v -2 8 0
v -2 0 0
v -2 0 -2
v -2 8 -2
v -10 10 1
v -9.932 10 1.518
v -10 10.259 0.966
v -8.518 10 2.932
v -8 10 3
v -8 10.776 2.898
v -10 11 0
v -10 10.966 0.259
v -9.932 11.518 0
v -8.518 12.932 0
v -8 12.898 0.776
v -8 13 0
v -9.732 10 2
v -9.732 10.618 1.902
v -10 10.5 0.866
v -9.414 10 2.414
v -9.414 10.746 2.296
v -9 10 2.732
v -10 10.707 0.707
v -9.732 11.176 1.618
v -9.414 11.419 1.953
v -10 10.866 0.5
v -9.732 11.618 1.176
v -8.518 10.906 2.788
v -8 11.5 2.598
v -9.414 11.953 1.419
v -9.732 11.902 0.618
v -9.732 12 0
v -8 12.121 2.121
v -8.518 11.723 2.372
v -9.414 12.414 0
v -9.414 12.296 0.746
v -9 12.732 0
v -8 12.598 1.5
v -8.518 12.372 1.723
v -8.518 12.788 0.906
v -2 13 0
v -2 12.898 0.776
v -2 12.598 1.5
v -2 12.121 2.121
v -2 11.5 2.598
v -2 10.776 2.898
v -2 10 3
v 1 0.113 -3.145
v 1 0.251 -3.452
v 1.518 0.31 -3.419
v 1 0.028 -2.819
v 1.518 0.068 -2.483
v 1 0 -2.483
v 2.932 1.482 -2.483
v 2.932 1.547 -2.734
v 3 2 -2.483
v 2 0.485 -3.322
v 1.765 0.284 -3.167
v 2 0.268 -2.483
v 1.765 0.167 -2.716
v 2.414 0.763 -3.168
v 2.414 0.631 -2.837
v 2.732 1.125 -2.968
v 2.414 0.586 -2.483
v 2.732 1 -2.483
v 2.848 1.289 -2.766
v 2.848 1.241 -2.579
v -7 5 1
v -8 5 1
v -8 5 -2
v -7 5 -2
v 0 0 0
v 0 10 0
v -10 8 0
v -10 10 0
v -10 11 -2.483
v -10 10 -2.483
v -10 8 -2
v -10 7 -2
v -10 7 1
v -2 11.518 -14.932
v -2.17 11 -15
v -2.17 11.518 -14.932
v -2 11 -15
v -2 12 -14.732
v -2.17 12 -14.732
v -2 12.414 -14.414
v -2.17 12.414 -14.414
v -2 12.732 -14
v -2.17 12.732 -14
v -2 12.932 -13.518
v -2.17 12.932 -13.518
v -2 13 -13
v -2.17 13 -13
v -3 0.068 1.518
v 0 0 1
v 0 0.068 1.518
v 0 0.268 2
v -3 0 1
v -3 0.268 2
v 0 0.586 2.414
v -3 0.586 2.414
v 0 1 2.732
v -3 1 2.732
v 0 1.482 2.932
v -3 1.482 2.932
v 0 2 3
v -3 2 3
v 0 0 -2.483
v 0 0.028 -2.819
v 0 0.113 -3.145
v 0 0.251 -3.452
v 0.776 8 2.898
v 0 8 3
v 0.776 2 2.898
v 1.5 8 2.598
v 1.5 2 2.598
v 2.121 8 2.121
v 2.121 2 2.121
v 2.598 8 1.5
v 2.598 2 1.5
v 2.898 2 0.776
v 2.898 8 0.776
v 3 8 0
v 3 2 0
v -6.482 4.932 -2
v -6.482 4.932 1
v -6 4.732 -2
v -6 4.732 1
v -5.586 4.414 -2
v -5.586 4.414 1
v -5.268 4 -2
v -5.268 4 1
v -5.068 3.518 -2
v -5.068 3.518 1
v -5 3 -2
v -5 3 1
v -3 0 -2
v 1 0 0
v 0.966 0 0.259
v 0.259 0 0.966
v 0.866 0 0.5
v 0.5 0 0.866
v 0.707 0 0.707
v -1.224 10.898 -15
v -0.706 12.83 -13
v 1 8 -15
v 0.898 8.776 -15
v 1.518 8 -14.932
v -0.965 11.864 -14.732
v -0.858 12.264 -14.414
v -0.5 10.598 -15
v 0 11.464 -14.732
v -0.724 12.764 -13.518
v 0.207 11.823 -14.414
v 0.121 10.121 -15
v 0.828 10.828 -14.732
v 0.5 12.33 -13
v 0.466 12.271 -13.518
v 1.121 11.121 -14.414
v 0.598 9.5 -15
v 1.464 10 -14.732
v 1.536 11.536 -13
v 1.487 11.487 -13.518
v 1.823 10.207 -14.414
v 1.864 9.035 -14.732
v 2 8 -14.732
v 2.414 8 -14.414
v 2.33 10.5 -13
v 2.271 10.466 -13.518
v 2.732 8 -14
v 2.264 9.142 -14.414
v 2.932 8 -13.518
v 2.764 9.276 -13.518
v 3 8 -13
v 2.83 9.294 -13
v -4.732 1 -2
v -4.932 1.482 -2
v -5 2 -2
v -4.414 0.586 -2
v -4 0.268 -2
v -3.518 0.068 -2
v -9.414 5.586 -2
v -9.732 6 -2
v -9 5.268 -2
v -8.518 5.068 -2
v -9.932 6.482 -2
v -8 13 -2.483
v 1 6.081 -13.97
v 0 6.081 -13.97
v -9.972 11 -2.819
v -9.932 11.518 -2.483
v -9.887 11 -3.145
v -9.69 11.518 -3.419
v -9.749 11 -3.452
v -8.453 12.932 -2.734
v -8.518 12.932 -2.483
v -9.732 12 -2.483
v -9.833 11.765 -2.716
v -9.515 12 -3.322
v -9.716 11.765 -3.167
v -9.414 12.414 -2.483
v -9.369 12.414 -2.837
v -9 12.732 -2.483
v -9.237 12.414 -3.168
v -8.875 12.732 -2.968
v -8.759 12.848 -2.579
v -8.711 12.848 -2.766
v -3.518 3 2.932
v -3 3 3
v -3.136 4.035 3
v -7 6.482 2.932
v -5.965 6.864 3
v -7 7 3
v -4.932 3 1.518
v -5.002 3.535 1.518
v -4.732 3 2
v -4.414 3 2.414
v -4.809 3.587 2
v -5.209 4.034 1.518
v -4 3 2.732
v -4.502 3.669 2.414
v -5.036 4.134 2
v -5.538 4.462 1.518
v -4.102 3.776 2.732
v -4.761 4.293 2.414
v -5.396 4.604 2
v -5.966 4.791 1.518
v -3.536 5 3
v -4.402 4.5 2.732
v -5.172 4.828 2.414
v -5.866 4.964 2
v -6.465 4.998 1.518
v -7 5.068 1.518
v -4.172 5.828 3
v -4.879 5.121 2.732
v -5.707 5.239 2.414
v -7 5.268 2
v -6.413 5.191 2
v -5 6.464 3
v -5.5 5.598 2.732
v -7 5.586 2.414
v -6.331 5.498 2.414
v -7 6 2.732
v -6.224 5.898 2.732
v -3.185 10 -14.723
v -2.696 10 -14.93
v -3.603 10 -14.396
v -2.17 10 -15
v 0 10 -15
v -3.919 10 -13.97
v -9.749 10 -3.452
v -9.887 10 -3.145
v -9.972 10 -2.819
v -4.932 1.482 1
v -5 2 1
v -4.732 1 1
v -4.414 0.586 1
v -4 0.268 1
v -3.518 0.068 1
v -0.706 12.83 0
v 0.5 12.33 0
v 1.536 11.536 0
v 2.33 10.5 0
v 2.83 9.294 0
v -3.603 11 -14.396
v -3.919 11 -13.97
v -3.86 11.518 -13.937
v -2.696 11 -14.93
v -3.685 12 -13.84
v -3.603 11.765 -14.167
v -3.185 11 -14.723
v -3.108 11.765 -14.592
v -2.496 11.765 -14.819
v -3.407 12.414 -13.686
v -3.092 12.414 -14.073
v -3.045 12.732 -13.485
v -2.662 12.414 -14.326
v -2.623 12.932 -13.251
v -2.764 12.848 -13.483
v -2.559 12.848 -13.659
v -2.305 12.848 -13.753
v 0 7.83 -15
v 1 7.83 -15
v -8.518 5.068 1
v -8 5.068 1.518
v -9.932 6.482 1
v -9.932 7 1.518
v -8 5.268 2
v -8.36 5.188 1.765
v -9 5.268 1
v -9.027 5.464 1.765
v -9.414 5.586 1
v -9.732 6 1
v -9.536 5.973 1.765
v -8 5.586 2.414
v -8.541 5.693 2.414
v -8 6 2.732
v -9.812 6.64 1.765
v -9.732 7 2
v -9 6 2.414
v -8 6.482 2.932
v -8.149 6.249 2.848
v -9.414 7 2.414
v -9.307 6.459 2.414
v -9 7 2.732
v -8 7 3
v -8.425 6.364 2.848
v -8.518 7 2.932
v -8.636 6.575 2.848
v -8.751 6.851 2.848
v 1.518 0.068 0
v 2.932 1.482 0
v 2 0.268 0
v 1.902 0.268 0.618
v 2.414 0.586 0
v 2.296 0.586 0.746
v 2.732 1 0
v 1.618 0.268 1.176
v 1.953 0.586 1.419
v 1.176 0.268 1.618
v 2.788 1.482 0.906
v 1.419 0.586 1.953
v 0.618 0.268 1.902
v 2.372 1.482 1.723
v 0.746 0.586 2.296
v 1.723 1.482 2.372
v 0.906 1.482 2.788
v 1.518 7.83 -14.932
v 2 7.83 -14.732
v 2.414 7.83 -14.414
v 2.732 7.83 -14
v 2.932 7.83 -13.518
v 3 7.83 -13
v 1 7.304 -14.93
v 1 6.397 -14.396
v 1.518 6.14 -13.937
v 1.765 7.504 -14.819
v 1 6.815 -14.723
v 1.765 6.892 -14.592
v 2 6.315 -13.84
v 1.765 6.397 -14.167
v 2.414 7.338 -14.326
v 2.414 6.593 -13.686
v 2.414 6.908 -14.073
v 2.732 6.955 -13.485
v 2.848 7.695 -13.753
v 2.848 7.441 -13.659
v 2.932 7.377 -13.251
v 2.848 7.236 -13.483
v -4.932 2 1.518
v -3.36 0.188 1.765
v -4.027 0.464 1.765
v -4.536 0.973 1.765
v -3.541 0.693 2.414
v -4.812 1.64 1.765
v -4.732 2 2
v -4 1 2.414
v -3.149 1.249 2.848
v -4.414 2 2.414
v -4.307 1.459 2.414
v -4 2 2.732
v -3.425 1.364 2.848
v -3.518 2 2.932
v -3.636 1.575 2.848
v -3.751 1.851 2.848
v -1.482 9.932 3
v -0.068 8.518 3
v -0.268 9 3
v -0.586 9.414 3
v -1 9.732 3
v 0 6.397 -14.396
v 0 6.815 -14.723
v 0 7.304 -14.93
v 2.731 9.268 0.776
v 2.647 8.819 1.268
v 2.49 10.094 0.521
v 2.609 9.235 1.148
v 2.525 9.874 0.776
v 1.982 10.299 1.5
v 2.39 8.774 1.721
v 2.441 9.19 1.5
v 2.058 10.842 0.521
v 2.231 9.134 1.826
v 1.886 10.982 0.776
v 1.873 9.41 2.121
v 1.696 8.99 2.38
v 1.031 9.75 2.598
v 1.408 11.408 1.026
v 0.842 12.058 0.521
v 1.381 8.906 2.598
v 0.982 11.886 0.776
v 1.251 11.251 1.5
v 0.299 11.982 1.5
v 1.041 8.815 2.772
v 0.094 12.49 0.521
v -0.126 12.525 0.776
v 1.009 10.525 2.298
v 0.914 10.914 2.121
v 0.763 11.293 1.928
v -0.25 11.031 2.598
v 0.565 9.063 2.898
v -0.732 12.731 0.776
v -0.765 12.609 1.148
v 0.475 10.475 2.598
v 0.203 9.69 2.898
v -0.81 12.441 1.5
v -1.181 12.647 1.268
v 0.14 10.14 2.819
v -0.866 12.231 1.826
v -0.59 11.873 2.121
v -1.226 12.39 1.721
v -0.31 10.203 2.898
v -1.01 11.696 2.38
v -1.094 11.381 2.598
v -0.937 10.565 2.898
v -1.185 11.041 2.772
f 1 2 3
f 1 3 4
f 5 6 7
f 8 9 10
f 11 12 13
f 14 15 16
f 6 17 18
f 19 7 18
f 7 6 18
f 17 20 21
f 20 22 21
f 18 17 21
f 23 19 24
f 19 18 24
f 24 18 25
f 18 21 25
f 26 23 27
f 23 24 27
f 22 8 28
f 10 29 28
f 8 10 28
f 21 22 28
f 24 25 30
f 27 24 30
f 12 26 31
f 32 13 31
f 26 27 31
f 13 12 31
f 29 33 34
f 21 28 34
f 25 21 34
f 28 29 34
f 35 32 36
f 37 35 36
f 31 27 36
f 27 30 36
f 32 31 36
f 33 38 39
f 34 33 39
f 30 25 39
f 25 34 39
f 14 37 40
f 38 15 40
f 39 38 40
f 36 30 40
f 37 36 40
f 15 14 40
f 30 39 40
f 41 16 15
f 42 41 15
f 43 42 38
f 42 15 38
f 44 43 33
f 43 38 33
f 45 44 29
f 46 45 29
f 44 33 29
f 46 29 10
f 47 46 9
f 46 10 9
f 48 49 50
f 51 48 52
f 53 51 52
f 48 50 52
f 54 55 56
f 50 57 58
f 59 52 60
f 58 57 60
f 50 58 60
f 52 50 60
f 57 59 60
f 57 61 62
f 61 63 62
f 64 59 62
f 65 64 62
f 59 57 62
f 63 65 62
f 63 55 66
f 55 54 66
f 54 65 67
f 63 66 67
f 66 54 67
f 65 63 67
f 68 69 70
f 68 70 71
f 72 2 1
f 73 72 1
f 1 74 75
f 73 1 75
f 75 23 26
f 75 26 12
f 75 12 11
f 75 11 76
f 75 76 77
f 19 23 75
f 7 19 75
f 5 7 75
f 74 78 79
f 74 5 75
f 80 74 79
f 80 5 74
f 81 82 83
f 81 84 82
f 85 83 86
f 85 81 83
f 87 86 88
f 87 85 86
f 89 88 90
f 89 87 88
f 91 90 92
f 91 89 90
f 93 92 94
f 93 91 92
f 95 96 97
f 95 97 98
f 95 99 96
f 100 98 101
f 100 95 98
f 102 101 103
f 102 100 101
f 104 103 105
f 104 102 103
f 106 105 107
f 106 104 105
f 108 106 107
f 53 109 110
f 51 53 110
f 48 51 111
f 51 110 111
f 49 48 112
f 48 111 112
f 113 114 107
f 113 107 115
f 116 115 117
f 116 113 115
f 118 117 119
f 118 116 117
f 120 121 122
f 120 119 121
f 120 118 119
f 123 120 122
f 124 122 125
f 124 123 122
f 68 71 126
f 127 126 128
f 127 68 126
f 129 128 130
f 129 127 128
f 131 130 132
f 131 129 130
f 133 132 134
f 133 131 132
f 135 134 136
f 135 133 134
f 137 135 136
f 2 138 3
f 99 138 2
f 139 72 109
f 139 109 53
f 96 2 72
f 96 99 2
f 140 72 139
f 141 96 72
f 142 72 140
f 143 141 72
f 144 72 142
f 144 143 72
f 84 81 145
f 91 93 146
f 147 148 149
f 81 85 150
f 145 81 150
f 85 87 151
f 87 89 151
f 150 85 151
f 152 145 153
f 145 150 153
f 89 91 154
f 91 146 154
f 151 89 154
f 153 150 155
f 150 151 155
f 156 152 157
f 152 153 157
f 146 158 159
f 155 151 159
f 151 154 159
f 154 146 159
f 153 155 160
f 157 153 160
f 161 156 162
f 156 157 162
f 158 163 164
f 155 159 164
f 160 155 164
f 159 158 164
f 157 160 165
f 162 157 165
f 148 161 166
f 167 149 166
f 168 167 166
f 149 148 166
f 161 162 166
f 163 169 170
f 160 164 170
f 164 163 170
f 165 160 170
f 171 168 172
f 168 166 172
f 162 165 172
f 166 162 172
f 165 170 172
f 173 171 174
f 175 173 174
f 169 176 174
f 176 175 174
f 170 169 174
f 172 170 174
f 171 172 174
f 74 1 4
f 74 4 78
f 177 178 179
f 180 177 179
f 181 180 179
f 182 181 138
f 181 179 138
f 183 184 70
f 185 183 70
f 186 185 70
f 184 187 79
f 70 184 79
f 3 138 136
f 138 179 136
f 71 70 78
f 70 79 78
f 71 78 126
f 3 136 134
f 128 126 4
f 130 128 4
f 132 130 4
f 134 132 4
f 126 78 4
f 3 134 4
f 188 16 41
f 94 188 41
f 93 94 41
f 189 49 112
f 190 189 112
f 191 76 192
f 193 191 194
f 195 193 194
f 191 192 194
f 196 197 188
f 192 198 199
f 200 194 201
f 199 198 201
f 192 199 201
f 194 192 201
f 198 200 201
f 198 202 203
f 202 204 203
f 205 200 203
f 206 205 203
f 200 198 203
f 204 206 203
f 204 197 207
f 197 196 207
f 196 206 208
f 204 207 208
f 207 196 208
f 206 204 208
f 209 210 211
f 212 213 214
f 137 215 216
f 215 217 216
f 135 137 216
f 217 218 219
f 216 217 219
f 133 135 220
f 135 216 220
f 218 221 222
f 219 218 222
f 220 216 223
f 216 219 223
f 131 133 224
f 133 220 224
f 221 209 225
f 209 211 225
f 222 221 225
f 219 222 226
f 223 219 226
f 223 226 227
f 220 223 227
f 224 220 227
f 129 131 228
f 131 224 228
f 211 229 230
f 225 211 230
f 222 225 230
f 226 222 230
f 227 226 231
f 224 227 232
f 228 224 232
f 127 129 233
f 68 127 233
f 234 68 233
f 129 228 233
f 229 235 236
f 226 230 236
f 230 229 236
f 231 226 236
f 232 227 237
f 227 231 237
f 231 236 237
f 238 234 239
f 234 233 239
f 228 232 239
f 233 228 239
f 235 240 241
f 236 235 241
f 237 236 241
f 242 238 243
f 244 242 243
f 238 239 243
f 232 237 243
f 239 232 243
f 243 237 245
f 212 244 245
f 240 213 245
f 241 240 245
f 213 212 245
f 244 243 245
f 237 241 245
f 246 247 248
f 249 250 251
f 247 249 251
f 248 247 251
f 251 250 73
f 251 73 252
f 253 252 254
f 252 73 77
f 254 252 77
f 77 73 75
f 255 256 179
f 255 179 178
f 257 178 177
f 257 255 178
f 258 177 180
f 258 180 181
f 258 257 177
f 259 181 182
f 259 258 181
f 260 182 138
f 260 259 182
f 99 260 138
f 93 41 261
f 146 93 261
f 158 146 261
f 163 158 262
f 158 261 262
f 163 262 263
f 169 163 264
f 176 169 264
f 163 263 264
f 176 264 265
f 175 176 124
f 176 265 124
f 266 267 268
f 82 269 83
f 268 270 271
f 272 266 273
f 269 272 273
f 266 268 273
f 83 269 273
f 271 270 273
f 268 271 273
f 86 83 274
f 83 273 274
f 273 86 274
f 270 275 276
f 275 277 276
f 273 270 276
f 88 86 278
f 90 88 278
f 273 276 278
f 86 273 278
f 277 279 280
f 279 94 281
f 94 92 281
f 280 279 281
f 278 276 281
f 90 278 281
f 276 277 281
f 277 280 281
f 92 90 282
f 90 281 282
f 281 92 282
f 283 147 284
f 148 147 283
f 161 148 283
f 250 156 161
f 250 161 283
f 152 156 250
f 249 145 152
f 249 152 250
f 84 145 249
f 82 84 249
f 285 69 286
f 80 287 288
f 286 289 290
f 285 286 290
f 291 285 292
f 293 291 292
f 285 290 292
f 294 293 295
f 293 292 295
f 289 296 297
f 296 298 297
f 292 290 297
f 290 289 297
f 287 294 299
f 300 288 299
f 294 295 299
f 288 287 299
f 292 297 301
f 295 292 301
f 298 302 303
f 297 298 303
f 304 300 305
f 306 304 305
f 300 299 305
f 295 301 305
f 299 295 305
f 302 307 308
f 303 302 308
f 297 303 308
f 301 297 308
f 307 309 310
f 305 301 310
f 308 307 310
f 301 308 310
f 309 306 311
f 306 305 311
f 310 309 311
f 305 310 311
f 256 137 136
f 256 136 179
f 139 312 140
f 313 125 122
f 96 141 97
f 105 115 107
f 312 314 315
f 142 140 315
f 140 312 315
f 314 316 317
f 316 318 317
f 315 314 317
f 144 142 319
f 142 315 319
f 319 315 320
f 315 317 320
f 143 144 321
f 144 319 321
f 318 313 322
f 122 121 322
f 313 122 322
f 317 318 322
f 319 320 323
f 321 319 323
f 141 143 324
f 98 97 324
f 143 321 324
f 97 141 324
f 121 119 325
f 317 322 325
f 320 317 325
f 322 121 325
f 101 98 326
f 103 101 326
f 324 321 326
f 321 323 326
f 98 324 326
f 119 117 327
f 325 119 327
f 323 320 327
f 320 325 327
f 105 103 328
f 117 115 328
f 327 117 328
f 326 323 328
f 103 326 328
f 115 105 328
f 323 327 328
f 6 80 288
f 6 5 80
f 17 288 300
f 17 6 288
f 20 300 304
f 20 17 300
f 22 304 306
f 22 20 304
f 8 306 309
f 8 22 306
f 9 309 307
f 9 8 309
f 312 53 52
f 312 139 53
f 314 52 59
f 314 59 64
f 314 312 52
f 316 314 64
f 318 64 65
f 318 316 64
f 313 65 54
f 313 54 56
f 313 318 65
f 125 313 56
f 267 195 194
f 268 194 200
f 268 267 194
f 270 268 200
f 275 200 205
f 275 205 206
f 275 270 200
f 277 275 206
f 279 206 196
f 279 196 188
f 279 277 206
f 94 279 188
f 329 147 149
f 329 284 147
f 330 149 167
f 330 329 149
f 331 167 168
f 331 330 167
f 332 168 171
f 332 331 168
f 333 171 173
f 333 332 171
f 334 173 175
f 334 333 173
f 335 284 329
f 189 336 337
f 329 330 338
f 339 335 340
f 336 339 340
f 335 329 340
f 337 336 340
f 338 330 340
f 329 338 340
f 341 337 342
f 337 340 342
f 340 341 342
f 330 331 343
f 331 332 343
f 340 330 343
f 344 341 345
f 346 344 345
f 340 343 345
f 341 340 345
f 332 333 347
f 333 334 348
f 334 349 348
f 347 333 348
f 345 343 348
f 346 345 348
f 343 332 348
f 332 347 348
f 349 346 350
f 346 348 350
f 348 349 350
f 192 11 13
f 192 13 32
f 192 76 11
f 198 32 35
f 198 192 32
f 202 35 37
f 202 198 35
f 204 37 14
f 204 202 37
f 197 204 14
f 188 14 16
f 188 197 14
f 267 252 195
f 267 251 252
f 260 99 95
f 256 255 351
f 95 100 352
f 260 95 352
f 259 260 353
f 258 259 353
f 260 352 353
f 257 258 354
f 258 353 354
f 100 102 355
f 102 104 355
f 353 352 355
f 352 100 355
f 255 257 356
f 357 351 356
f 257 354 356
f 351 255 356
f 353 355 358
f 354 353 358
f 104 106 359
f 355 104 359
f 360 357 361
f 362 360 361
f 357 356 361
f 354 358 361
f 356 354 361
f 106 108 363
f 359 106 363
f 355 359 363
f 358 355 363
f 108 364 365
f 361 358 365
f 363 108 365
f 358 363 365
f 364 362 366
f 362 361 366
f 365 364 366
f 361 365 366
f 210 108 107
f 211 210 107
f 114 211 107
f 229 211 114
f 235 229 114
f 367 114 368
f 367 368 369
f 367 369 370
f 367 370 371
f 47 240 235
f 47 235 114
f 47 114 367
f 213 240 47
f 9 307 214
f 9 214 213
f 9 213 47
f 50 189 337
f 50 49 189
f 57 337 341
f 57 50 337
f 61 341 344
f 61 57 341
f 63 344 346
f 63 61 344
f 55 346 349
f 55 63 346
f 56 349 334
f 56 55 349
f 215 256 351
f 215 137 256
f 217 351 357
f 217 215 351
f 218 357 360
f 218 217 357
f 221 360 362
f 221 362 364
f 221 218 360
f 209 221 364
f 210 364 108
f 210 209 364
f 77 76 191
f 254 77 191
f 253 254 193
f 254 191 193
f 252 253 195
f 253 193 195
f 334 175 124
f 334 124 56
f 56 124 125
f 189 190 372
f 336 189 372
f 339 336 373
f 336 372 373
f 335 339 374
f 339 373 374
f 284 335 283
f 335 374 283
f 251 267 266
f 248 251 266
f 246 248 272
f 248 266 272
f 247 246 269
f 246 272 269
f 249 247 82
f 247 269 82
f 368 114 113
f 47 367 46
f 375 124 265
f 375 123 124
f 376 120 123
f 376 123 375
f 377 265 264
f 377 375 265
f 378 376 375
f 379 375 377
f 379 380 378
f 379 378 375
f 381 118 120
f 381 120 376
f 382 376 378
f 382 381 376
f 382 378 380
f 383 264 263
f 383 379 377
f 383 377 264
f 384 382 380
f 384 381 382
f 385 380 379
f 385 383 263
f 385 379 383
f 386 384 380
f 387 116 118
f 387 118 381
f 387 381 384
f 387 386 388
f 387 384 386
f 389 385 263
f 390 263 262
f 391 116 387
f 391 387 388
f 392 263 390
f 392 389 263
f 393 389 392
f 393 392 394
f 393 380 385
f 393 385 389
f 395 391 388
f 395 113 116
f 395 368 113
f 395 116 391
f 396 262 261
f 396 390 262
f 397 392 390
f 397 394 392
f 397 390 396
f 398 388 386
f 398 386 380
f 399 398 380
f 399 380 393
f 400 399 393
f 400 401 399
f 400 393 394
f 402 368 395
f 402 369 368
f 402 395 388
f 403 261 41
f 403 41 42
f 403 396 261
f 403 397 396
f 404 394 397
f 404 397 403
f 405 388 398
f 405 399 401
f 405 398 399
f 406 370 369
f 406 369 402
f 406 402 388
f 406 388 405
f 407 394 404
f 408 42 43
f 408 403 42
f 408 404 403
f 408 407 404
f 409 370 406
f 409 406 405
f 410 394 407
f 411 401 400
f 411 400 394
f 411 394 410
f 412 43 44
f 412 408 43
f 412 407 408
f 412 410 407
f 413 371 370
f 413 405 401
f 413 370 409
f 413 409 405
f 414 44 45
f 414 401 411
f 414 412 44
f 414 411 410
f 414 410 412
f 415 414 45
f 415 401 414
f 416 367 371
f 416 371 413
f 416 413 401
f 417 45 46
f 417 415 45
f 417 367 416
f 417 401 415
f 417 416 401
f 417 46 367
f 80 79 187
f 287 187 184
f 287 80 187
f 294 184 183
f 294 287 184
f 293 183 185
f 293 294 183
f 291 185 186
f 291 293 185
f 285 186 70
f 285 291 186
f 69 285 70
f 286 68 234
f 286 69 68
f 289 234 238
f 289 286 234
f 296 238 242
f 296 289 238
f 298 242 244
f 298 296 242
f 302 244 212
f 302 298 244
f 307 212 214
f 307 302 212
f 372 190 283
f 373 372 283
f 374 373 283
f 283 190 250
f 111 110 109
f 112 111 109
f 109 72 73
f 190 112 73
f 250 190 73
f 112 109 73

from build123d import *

# Parameters (mm, degrees)
BOSS_EXTRUDE1_DEPTH = 3
SKETCH2_W           = 10
SKETCH2_H           = 3
BOSS_EXTRUDE2_DEPTH = 3
SKETCH3_W           = 3
SKETCH3_H           = 13
BOSS_EXTRUDE3_DEPTH = 3
BOSS_EXTRUDE4_DEPTH = 15
FILLET1_R           = 3
FILLET2_R           = 2
CHAMFER1_SIZE       = 12
CHAMFER1_SIZE2      = 6.651708617
FILLET3_R           = 2
CHAMFER2_SIZE       = 12
CHAMFER2_SIZE2      = 6.651708617
FILLET4_R           = 2
FILLET5_R           = 5
FILLET7_R           = 2
BOSS_EXTRUDE5_DEPTH = 2


with BuildPart() as part:
    # Sketch1 → Boss-Extrude1 (new body)
    with BuildSketch(Plane.XY):
        Polygon((-10, 5), (-5, 5), (-5, 0), (0, 0), (0, 10), (-10, 10), align=None)
    extrude(amount=BOSS_EXTRUDE1_DEPTH)

    # Sketch2 → Boss-Extrude2 (add)
    with BuildSketch(Plane(origin=(0, 10, 0), x_dir=(1, 0, 0), z_dir=(0, 1, 0))):
        with Locations((-5, -1.5)):
            Rectangle(SKETCH2_W, SKETCH2_H)
    extrude(amount=BOSS_EXTRUDE2_DEPTH)

    # Sketch3 → Boss-Extrude3 (add)
    with BuildSketch(Plane(origin=(0, 0, 0), x_dir=(0, 0, -1), z_dir=(1, 0, 0))):
        with Locations((-1.5, 6.5)):
            Rectangle(SKETCH3_W, SKETCH3_H)
    extrude(amount=BOSS_EXTRUDE3_DEPTH)

    # Sketch4 → Boss-Extrude4 (add)
    with BuildSketch(Plane(origin=(0, 0, 0), x_dir=(-1, 0, 0), z_dir=(0, 0, -1))):
        Polygon((10, 13), (-3, 13), (-3, 9.459168036), (-3, 0), (0, 0), (0, 10), (10, 10), align=None)
    extrude(amount=BOSS_EXTRUDE4_DEPTH)

    # Fillet1
    fillet1_edges = [part.edges().sort_by_distance(p)[0] for p in [
        (-3.5, 13, 3),
        (3, 6.5, 3),
    ]]
    fillet(fillet1_edges, radius=FILLET1_R)

    # Fillet2
    fillet2_edges = [part.edges().sort_by_distance(p)[0] for p in [
        (-5, 5, 1.5),
        (-10, 5, 1.5),
        (-5, 0, 1.5),
    ]]
    fillet(fillet2_edges, radius=FILLET2_R)

    # Chamfer1
    chamfer1_edges = [part.edges().sort_by_distance(p)[0] for p in [
        (-10, 11.5, -15),
    ]]
    chamfer1_side = [part.faces().sort_by_distance(p)[0] for p in [
        (-10, 11.031627007, -5.158135036),
    ]]
    chamfer(chamfer1_edges, length=CHAMFER1_SIZE, length2=CHAMFER1_SIZE2, reference=chamfer1_side[0])

    # Fillet3
    fillet3_edges = [part.edges().sort_by_distance(p)[0] for p in [
        (-3.348291383, 11.5, -15),
        (-10, 11.5, -3),
    ]]
    fillet(fillet3_edges, radius=FILLET3_R)

    # Chamfer2
    chamfer2_edges = [part.edges().sort_by_distance(p)[0] for p in [
        (1.5, 0, -15),
    ]]
    chamfer2_side = [part.faces().sort_by_distance(p)[0] for p in [
        (1.031627007, 0, -5.158135036),
    ]]
    chamfer(chamfer2_edges, length=CHAMFER2_SIZE, length2=CHAMFER2_SIZE2, reference=chamfer2_side[0])

    # Fillet4
    fillet4_edges = [part.edges().sort_by_distance(p)[0] for p in [
        (1.5, 6.651708617, -15),
        (1.5, 0, -3),
    ]]
    fillet(fillet4_edges, radius=FILLET4_R)

    # Fillet5
    # the kernel refuses this fillet: 5 mm, written as the material it takes off along each edge
    with BuildSketch(Plane(origin=(-2, 8, 3), x_dir=(1, 0, 0), z_dir=(0, -1, 0))) as fillet5_piece_1:
        with BuildLine():
            CenterArc((2, -3), 3, 0, 90)
            Line((5, -3), (5, 0))
            Line((5, 0), (2, 0))
        make_face()
    revolve(axis=Axis((-2, 8, 3), (0, 0, 1)), revolution_arc=90, mode=Mode.SUBTRACT)
    with BuildSketch(Plane(origin=(3, 13, 3), x_dir=(0, -1, 0), z_dir=(0, 0, -1))) as fillet5_piece_2:
        with BuildLine():
            CenterArc((FILLET5_R, FILLET5_R), FILLET5_R, 180, 90)
            Line((0, FILLET5_R), (0, 0))
            Line((0, 0), (FILLET5_R, 0))
        make_face()
    extrude(amount=30.5, mode=Mode.SUBTRACT)

    # Fillet7
    fillet7_edges = [part.edges().sort_by_distance(p)[0] for p in [
        (-2.085100675, 13, -15),
        (-6.834340089, 13, -8.711001656),
        (-10, 13, -1.241382416),
        (-9.936295281, 13, -2.983524839),
        (-3.185278076, 13, -14.723258321),
        (3, 3.165659911, -8.711001656),
        (3, 0.063704719, -2.983524839),
        (3, 6.814721924, -14.723258321),
        (3, 7.914899325, -15),
        (1.535533906, 11.535533906, -15),
        (3, 0, -1.241382416),
        (2.121320344, 0, 2.121320344),
        (-10, 8.5, 3),
        (-10, 12.121320344, 2.121320344),
        (-5, 2.5, 3),
        (-7.5, 5, 3),
        (-1.5, 0, 3),
        (-4.414213562, 0.585786438, 3),
        (-9.414213562, 5.585786438, 3),
        (-5.585786438, 4.414213562, 3),
    ]]
    fillet(fillet7_edges, radius=FILLET7_R)

    # Sketch5 → Boss-Extrude5 (add)
    with BuildSketch(Plane(origin=(0, 0, 0), x_dir=(-1, 0, 0), z_dir=(0, 0, -1))):
        with BuildLine():
            Line((10, 8), (10, 7))
            ThreePointArc((10, 7), (9.414213562, 5.585786438), (8, 5))
            Line((8, 5), (7, 5))
            ThreePointArc((7, 5), (5.585786438, 4.414213562), (5, 3))
            Line((5, 3), (5, 2))
            ThreePointArc((5, 2), (4.414213562, 0.585786438), (3, 0))
            Line((3, 0), (2, 0))
            Line((2, 0), (2, 8))
            Line((2, 8), (10, 8))
        make_face()
    extrude(amount=BOSS_EXTRUDE5_DEPTH)


solid = part.part
